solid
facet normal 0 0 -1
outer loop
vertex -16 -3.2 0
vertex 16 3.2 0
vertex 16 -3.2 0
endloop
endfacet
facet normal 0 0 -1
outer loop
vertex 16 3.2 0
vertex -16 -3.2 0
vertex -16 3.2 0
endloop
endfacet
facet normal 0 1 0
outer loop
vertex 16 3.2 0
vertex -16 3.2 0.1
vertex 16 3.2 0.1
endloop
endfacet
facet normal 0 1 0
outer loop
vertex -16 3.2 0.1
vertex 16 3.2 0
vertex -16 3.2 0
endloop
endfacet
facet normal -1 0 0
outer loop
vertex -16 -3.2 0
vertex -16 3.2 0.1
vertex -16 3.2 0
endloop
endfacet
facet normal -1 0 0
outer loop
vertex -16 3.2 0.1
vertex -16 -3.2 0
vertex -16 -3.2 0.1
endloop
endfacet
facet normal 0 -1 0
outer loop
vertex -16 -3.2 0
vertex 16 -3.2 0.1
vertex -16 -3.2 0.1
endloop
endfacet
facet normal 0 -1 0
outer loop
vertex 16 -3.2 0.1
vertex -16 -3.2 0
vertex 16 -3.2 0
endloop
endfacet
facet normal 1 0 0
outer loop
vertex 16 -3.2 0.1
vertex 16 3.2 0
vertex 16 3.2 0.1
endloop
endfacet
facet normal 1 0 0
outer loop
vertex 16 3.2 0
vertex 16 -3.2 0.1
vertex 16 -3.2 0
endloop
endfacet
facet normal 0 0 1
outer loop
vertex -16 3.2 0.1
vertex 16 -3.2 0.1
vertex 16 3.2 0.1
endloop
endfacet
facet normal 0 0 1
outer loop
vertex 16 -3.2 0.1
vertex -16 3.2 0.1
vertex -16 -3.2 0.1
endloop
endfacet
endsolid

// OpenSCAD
// file: ../p/box5-12.scad
use <../lib.scad>
function ldraw_lib__box5_12() = [
// 0 Box with 5 Faces without Any Edges
// 0 Name: box5-12.dat
// 0 Author: Chris Dee [cwdee]
// 0 !LDRAW_ORG Primitive UPDATE 2009-02
// 0 !LICENSE Licensed under CC BY 4.0 : see CAreadme.txt
// 
// 0 BFC CERTIFY CCW
  [0,"BFC","CERTIFY"],
  [0,"BFC","CCW"],
// 
// 0 !HISTORY 2009-09-03 [PTadmin] Official Update 2009-02
// 
// 
// 4 16 1 1 1 1 1 -1 -1 1 -1 -1 1 1
  [4,16,1,1,1,1,1,-1,-1,1,-1,-1,1,1],
// 4 16 -1 0 1 1 0 1 1 1 1 -1 1 1
  [4,16,-1,0,1,1,0,1,1,1,1,-1,1,1],
// 4 16 -1 0 -1 -1 0 1 -1 1 1 -1 1 -1
  [4,16,-1,0,-1,-1,0,1,-1,1,1,-1,1,-1],
// 4 16 1 0 -1 -1 0 -1 -1 1 -1 1 1 -1
  [4,16,1,0,-1,-1,0,-1,-1,1,-1,1,1,-1],
// 4 16 1 0 1 1 0 -1 1 1 -1 1 1 1
  [4,16,1,0,1,1,0,-1,1,1,-1,1,1,1],
// 0
];
module ldraw_lib__box5_12(step=0, col=false, unit=2/5, alt=false, line=0.2, solid=!$preview)
    makepoly(ldraw_lib__box5_12(), step=step, col=col, unit=unit, alt=alt, line=line, solid=solid);
ldraw_lib__box5_12(line=0.2);
// main file
use <../lib.scad>
use <../p/box5-12.scad>
function ldraw_lib__4616559k() = [
// 0 Sticker  0.8 x  4 White
// 0 Name: 4616559k.dat
// 0 Author: J.C. Tchang [tchang]
// 0 !LDRAW_ORG Part UPDATE 2012-03
// 0 !LICENSE Licensed under CC BY 4.0 : see CAreadme.txt
// 
// 0 BFC CERTIFY CCW
  [0,"BFC","CERTIFY"],
  [0,"BFC","CCW"],
// 
// 0 !KEYWORDS Set 10219
// 
// 0 !HISTORY 2012-12-28 [PTadmin] Official Update 2012-03
// 
// 
// 1 16 0 -0.25 0 40 0 0 0 0.25 0 0 0 8 box5-12.dat
  [1,16,0,-0.25,0,40,0,0,0,0.25,0,0,0,8, ldraw_lib__box5_12()],
// 0 //
// 4 15 40 -0.25 -8 40 -0.25 8 -40 -0.25 8 -40 -0.25 -8
  [4,15,40,-0.25,-8,40,-0.25,8,-40,-0.25,8,-40,-0.25,-8],
];
module ldraw_lib__4616559k(step=0, col=false, unit=2/5, alt=false, line=0.2, solid=!$preview)
    makepoly(ldraw_lib__4616559k(), step=step, col=col, unit=unit, alt=alt, line=line, solid=solid);
ldraw_lib__4616559k(line=0.2);
